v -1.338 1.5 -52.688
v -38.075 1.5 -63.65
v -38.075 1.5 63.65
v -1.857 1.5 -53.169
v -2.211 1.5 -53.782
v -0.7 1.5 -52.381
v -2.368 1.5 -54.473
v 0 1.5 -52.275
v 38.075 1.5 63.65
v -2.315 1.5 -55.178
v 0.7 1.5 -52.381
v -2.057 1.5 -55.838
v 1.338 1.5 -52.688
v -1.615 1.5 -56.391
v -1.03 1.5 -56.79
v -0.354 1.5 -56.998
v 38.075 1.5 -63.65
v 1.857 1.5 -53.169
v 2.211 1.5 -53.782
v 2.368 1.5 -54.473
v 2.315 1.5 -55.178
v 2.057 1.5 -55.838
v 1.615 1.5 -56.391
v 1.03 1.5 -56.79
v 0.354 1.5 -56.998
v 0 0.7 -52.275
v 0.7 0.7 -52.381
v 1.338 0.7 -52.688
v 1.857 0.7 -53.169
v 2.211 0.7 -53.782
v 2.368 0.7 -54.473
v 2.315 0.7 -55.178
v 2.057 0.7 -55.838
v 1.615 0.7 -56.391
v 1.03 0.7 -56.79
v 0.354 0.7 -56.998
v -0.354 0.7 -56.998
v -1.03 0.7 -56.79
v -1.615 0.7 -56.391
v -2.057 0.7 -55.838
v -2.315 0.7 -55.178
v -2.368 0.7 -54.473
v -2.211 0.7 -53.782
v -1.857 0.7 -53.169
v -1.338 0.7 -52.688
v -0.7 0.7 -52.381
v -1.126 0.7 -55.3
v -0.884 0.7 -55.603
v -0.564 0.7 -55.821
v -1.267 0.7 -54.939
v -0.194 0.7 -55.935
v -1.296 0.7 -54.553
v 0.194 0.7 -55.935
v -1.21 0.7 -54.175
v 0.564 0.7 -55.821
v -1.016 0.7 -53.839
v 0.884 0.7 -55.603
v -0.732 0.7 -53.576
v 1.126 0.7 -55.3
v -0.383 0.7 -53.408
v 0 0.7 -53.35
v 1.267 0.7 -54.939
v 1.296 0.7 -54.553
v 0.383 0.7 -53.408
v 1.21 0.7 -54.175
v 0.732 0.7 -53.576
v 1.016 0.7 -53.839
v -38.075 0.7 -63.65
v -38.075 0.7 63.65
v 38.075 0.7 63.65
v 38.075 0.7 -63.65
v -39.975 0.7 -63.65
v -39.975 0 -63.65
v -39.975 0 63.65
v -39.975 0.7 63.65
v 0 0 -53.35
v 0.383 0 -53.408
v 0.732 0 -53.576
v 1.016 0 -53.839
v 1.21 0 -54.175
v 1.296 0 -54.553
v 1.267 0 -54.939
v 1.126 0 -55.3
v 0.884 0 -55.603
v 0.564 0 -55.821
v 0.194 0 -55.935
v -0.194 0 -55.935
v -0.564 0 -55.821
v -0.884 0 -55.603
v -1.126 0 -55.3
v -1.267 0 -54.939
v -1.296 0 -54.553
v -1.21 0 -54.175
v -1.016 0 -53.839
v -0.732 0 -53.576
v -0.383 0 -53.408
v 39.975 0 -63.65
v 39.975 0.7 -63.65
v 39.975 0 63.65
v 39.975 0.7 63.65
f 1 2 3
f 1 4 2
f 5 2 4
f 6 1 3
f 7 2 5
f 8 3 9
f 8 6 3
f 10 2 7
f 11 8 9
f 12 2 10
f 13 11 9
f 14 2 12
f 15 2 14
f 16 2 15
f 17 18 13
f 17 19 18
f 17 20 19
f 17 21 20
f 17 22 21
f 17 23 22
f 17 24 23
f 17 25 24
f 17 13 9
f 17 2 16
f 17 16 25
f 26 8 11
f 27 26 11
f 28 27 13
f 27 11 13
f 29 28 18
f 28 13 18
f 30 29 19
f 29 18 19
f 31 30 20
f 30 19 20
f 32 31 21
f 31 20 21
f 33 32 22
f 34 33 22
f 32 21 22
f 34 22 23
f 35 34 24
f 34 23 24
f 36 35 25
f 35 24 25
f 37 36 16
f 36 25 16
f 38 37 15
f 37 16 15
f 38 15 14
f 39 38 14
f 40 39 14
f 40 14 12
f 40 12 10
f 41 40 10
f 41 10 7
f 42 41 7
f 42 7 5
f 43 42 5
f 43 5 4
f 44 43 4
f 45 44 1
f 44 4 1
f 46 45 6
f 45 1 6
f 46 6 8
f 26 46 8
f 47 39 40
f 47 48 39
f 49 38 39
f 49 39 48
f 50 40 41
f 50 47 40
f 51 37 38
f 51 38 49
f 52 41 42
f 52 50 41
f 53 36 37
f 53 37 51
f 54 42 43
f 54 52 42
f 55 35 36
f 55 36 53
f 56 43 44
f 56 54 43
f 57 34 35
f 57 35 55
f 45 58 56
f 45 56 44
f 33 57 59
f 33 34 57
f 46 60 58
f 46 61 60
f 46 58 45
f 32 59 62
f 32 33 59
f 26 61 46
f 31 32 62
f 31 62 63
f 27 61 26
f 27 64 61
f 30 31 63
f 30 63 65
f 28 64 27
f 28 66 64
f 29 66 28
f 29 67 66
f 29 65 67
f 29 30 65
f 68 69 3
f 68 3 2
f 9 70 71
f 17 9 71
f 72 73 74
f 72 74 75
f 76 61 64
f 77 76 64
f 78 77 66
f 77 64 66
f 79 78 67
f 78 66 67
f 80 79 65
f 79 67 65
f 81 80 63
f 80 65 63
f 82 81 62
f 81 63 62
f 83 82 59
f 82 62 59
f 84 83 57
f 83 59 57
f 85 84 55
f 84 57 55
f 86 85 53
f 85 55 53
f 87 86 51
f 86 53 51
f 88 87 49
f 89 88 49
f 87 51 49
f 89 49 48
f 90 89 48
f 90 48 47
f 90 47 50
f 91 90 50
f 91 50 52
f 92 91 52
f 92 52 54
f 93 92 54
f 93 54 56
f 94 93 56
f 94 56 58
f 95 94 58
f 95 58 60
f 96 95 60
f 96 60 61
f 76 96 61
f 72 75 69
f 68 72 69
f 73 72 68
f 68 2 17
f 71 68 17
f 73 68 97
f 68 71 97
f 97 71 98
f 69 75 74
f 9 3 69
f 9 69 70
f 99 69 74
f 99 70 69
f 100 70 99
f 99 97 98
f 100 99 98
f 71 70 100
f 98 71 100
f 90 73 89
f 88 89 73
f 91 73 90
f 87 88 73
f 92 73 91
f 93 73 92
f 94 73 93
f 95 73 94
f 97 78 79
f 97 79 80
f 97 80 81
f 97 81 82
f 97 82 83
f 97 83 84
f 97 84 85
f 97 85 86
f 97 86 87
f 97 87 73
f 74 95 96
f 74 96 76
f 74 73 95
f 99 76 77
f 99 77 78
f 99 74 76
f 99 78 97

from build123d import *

# Parameters (mm, degrees)
SKETCH_1_W          = 76.15
SKETCH_1_H          = 127.3
EXTRUDE_1_DEPTH     = 1.5
SKETCH_2_W          = 1.9
SKETCH_2_H          = 0.7
EXTRUDE_2_DEPTH     = 127.3
SKETCH_3_R          = 1.3
CUT_EXTRUDE_1_DEPTH = 76.176945435
SKETCH_5_R          = 2.375
CUT_EXTRUDE_2_DEPTH = 0.8


with BuildPart() as part:
    # Эскиз1 → Бобышка-Вытянуть1 (new body)
    with BuildSketch(Plane(origin=(0, 0, 0), x_dir=(1, 0, 0), z_dir=(0, 1, 0))):
        Rectangle(SKETCH_1_W, SKETCH_1_H)
    extrude(amount=EXTRUDE_1_DEPTH)

    # Эскиз2 → Бобышка-Вытянуть2 (add)
    with BuildSketch(Plane.XY.offset(63.65)):
        with Locations((-39.025, 0.35)):
            Rectangle(SKETCH_2_W, SKETCH_2_H)
        with Locations((39.025, 0.35)):
            Rectangle(SKETCH_2_W, SKETCH_2_H)
    extrude(amount=-EXTRUDE_2_DEPTH)

    # Эскиз3 → Вырез-Вытянуть1 (cut, through all)
    with BuildSketch(Plane(origin=(0, 1.5, 0), x_dir=(1, 0, 0), z_dir=(0, 1, 0))):
        with Locations(Location((0, 54.65, 0), (0, 0, 270))):
            Circle(SKETCH_3_R)
    extrude(amount=-CUT_EXTRUDE_1_DEPTH, mode=Mode.SUBTRACT)

    # Эскиз5 → Вырез-Вытянуть2 (cut)
    with BuildSketch(Plane(origin=(0, 1.5, 0), x_dir=(1, 0, 0), z_dir=(0, 1, 0))):
        with Locations(Location((0, 54.65, 0), (0, 0, 270))):
            Circle(SKETCH_5_R)
    extrude(amount=-CUT_EXTRUDE_2_DEPTH, mode=Mode.SUBTRACT)


solid = part.part
